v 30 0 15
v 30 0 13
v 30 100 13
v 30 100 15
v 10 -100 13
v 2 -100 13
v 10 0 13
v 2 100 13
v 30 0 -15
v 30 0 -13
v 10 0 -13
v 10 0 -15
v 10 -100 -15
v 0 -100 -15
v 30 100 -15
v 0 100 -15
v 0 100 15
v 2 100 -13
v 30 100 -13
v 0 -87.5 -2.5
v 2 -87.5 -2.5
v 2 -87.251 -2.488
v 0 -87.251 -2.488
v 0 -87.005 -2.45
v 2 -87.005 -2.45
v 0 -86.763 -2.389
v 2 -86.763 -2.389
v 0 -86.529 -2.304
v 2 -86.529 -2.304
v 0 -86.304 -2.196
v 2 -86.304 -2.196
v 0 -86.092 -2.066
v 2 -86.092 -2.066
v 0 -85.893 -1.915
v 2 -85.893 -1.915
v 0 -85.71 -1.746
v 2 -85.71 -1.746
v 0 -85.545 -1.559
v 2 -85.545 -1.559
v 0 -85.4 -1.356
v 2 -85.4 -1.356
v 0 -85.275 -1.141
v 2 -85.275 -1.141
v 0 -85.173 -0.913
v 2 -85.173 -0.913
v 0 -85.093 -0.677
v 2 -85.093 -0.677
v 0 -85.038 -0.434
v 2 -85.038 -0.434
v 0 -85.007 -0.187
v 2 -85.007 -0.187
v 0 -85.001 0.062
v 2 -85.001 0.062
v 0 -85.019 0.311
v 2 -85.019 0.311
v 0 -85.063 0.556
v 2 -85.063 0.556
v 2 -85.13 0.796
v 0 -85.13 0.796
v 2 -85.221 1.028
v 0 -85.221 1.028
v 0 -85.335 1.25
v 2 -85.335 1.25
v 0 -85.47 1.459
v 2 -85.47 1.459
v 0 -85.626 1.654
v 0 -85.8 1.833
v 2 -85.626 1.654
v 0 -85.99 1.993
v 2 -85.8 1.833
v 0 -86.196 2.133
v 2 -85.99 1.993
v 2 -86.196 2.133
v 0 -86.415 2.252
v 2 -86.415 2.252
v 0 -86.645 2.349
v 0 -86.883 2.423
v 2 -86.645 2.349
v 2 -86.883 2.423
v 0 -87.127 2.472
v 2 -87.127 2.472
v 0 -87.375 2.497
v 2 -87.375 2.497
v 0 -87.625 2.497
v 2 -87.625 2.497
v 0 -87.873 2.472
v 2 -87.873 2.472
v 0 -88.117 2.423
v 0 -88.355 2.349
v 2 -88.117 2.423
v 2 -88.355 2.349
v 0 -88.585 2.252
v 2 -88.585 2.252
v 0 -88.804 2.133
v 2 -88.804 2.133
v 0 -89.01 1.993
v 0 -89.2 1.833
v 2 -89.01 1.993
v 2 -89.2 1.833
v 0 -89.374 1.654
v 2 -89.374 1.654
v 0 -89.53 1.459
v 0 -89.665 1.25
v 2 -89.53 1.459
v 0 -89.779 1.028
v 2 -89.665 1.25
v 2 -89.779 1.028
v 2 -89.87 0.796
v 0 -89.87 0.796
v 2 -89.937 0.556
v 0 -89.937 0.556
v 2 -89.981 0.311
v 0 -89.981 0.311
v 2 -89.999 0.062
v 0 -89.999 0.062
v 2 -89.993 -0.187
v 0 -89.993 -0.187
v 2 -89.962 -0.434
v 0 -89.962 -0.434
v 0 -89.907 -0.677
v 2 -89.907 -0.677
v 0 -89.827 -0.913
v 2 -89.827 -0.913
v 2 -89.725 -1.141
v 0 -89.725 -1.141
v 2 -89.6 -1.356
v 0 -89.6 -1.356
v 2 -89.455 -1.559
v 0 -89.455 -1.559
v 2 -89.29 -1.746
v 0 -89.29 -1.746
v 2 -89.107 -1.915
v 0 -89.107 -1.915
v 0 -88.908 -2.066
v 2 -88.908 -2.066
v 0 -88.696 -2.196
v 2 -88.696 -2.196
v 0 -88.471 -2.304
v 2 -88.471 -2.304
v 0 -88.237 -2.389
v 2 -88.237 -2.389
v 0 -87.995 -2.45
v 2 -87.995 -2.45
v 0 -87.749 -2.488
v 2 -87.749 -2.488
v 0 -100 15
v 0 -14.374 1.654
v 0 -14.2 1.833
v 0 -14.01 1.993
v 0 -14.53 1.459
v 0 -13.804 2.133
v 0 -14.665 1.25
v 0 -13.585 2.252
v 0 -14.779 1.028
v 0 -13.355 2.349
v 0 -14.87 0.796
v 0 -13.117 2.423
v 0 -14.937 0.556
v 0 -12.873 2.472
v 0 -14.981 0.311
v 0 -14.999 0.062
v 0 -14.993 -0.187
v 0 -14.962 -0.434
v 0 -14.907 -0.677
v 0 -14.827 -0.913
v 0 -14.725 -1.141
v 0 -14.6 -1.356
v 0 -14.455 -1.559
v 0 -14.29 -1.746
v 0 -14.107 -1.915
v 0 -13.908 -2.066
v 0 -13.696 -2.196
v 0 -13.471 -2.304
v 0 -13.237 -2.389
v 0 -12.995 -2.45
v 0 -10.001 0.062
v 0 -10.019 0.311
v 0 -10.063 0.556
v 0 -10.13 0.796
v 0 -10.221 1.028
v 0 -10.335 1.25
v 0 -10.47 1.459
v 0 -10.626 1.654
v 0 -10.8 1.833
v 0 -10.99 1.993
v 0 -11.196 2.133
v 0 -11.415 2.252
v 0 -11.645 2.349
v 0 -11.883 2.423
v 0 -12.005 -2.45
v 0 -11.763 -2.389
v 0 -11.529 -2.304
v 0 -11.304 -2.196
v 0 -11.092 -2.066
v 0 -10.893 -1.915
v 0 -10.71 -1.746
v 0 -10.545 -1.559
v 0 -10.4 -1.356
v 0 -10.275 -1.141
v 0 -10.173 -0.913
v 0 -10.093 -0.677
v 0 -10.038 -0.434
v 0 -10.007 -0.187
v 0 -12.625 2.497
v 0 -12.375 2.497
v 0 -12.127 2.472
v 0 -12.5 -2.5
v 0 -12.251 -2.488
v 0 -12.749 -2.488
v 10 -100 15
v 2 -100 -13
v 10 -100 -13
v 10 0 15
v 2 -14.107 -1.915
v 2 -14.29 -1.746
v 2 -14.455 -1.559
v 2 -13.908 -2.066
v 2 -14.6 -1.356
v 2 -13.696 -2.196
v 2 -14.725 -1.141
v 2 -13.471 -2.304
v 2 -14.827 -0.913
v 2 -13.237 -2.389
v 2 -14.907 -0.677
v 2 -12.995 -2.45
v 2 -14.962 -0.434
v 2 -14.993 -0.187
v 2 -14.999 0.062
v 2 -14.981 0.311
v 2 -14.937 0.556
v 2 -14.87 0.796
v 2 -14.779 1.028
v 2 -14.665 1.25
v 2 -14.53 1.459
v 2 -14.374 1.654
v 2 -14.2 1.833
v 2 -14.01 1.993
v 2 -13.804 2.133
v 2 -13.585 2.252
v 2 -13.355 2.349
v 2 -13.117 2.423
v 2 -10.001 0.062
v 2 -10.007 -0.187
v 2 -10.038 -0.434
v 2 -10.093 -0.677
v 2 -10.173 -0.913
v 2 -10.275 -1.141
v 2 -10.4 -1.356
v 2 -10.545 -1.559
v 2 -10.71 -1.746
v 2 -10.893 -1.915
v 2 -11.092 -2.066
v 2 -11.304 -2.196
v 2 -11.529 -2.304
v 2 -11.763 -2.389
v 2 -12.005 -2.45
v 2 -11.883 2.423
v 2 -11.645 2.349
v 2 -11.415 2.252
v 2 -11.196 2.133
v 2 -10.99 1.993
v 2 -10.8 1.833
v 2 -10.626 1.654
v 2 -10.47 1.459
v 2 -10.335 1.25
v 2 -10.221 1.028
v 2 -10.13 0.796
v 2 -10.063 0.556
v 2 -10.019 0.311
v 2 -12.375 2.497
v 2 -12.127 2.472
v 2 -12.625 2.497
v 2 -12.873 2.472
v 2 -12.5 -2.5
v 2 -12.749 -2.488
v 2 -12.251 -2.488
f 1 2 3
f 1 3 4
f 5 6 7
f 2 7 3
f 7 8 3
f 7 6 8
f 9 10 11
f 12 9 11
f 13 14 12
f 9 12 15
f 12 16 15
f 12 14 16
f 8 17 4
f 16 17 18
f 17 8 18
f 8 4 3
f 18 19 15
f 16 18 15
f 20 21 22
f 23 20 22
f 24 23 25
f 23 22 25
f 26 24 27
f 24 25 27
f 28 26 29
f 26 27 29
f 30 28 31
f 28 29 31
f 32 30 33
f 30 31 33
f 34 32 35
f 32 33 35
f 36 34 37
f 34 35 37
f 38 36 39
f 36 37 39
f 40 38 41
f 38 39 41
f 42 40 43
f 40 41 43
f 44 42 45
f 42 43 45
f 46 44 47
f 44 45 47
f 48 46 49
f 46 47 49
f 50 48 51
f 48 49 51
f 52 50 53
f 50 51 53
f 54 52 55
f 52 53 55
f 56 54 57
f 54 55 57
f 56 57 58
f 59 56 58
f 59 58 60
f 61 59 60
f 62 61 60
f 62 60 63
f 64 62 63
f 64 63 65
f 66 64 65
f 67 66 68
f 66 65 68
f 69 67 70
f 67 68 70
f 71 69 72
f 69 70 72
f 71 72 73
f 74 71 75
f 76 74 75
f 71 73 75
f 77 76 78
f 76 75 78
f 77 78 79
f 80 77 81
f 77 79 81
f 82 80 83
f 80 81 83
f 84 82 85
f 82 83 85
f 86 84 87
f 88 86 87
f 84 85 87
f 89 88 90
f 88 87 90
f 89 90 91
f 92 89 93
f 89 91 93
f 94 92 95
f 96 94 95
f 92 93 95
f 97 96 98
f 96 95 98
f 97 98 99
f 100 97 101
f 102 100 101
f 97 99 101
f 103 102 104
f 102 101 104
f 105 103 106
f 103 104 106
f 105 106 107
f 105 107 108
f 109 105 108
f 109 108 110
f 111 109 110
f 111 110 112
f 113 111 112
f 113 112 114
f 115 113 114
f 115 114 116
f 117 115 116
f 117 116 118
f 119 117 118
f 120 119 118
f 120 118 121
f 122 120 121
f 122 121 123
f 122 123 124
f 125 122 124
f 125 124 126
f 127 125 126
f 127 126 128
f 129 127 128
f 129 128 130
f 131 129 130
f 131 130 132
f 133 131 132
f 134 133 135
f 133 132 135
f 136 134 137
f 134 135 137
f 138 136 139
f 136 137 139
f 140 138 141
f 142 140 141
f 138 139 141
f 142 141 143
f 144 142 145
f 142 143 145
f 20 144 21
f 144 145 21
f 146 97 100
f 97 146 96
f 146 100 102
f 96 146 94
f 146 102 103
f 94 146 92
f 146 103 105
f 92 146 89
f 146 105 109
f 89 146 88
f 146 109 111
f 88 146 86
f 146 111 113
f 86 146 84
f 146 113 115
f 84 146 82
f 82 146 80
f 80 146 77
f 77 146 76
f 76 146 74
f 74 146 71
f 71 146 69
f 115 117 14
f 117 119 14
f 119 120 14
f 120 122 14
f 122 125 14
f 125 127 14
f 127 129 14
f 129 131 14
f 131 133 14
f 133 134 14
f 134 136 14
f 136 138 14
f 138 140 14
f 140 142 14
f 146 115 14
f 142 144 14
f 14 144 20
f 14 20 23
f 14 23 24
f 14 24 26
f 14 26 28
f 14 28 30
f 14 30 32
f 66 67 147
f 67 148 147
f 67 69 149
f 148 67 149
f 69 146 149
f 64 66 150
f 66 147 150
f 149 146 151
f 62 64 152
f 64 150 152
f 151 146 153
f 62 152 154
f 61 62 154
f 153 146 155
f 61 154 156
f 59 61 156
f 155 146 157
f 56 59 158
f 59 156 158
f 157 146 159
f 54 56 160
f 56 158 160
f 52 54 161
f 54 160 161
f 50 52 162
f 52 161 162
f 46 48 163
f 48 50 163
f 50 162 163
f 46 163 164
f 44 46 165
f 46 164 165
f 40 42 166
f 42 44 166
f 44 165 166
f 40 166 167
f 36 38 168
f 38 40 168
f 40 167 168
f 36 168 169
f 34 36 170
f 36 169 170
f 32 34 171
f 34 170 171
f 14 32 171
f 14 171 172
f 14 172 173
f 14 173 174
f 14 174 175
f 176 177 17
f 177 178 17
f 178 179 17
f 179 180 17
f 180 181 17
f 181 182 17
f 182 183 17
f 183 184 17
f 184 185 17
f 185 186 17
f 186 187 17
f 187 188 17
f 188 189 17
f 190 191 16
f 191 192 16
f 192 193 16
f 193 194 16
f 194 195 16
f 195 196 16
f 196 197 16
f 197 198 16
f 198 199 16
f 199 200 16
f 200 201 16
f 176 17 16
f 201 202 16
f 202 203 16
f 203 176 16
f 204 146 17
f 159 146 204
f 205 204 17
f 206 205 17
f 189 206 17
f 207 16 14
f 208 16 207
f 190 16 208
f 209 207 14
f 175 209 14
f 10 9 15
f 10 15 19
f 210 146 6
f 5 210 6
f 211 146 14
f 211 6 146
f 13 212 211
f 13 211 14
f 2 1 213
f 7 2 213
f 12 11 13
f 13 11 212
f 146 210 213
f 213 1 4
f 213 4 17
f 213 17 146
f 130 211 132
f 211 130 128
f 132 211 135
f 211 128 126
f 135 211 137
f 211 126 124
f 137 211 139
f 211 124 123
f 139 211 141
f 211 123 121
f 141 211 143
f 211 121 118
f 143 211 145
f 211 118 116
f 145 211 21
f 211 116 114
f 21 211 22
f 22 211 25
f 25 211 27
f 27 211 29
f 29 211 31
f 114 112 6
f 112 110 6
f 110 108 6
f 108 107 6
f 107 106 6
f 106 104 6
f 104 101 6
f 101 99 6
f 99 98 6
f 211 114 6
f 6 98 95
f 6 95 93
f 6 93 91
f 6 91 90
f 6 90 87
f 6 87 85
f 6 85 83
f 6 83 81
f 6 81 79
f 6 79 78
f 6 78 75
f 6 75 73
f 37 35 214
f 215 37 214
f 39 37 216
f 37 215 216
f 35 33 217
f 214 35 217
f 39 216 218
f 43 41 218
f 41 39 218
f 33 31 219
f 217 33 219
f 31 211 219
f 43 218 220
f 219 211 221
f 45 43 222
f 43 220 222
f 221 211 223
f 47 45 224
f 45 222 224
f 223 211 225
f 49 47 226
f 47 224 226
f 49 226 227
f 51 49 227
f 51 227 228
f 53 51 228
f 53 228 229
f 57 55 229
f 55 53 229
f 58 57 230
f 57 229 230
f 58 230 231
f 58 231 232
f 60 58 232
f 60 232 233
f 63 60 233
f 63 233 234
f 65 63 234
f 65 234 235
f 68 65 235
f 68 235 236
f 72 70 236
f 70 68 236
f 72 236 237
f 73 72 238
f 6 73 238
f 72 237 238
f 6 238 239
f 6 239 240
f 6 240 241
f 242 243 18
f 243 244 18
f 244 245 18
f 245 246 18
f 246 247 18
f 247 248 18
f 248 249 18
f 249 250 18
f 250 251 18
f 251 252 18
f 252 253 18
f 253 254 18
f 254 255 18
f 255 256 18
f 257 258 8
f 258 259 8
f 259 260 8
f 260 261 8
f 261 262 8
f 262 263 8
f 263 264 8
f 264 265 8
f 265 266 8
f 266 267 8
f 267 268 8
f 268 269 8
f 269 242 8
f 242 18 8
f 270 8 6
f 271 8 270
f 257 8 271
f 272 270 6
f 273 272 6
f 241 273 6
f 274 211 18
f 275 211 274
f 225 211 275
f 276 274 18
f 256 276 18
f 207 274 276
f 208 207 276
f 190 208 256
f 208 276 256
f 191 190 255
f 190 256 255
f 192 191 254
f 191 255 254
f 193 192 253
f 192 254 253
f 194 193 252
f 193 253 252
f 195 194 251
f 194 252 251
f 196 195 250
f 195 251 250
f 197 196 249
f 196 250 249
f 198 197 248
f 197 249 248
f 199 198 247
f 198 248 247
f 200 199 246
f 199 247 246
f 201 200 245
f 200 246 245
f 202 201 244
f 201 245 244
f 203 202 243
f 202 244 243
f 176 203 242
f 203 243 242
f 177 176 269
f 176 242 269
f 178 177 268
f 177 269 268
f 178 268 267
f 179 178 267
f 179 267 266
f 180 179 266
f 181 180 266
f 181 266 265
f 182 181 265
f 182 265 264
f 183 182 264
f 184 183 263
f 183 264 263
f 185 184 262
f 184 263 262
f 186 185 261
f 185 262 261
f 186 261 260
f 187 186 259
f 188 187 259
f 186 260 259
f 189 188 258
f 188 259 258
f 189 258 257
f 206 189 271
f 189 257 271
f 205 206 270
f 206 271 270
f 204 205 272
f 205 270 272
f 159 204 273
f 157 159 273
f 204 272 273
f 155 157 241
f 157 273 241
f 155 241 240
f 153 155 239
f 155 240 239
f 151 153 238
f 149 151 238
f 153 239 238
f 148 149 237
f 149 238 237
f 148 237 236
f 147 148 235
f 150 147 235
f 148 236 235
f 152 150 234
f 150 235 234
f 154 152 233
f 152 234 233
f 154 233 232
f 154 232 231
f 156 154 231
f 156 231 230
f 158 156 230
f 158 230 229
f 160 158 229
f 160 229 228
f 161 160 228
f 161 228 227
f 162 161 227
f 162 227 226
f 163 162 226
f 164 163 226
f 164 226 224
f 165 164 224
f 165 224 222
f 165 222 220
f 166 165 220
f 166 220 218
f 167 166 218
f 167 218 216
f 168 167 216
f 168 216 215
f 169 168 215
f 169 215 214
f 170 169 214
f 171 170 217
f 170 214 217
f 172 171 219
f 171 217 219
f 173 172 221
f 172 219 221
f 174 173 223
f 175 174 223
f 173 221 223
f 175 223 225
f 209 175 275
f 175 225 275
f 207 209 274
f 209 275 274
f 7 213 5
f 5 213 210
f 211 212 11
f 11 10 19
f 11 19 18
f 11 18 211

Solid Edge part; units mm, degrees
sketch "Sketch1" plane through (0, 0, 0) normal (0, -1, 0) x (1, 0, 0)
  line L0 (0, 15) -> (0, -15)
  line L1 (0, -15) -> (30, -15)
  line L2 (30, -15) -> (30, -13)
  line L3 (30, -13) -> (2, -13)
  line L4 (2, -13) -> (2, 13)
  line L5 (2, 13) -> (30, 13)
  line L6 (30, 13) -> (30, 15)
  line L7 (30, 15) -> (0, 15)
  dimension "D1" = 2
  dimension "D2" = 30
  dimension "D3" = 28
extrude "Protrusion1" add sketch "Sketch1" along normal mid plane 200
sketch "Sketch2" plane through (15, 0, 15) normal (0, 0, 1) x (0, -1, 0)
  line L0 (0, 15) -> (0, -5)
  line L1 (0, -5) -> (100, -5)
  line L2 (100, -5) -> (100, 15)
  line L3 (100, 15) -> (0, 15)
  dimension "D1" = 20
extrude "Cutout1" cut sketch "Sketch2" against normal through all
hole "Hole_1" at (2, -87.5, 0) direction (-1, 0, 0) diameter 5 end up to next
hole "Hole1" at (2, -12.5, 0) direction (-1, 0, 0) diameter 5 end up to next
properties material "Aluminum, 1060"
